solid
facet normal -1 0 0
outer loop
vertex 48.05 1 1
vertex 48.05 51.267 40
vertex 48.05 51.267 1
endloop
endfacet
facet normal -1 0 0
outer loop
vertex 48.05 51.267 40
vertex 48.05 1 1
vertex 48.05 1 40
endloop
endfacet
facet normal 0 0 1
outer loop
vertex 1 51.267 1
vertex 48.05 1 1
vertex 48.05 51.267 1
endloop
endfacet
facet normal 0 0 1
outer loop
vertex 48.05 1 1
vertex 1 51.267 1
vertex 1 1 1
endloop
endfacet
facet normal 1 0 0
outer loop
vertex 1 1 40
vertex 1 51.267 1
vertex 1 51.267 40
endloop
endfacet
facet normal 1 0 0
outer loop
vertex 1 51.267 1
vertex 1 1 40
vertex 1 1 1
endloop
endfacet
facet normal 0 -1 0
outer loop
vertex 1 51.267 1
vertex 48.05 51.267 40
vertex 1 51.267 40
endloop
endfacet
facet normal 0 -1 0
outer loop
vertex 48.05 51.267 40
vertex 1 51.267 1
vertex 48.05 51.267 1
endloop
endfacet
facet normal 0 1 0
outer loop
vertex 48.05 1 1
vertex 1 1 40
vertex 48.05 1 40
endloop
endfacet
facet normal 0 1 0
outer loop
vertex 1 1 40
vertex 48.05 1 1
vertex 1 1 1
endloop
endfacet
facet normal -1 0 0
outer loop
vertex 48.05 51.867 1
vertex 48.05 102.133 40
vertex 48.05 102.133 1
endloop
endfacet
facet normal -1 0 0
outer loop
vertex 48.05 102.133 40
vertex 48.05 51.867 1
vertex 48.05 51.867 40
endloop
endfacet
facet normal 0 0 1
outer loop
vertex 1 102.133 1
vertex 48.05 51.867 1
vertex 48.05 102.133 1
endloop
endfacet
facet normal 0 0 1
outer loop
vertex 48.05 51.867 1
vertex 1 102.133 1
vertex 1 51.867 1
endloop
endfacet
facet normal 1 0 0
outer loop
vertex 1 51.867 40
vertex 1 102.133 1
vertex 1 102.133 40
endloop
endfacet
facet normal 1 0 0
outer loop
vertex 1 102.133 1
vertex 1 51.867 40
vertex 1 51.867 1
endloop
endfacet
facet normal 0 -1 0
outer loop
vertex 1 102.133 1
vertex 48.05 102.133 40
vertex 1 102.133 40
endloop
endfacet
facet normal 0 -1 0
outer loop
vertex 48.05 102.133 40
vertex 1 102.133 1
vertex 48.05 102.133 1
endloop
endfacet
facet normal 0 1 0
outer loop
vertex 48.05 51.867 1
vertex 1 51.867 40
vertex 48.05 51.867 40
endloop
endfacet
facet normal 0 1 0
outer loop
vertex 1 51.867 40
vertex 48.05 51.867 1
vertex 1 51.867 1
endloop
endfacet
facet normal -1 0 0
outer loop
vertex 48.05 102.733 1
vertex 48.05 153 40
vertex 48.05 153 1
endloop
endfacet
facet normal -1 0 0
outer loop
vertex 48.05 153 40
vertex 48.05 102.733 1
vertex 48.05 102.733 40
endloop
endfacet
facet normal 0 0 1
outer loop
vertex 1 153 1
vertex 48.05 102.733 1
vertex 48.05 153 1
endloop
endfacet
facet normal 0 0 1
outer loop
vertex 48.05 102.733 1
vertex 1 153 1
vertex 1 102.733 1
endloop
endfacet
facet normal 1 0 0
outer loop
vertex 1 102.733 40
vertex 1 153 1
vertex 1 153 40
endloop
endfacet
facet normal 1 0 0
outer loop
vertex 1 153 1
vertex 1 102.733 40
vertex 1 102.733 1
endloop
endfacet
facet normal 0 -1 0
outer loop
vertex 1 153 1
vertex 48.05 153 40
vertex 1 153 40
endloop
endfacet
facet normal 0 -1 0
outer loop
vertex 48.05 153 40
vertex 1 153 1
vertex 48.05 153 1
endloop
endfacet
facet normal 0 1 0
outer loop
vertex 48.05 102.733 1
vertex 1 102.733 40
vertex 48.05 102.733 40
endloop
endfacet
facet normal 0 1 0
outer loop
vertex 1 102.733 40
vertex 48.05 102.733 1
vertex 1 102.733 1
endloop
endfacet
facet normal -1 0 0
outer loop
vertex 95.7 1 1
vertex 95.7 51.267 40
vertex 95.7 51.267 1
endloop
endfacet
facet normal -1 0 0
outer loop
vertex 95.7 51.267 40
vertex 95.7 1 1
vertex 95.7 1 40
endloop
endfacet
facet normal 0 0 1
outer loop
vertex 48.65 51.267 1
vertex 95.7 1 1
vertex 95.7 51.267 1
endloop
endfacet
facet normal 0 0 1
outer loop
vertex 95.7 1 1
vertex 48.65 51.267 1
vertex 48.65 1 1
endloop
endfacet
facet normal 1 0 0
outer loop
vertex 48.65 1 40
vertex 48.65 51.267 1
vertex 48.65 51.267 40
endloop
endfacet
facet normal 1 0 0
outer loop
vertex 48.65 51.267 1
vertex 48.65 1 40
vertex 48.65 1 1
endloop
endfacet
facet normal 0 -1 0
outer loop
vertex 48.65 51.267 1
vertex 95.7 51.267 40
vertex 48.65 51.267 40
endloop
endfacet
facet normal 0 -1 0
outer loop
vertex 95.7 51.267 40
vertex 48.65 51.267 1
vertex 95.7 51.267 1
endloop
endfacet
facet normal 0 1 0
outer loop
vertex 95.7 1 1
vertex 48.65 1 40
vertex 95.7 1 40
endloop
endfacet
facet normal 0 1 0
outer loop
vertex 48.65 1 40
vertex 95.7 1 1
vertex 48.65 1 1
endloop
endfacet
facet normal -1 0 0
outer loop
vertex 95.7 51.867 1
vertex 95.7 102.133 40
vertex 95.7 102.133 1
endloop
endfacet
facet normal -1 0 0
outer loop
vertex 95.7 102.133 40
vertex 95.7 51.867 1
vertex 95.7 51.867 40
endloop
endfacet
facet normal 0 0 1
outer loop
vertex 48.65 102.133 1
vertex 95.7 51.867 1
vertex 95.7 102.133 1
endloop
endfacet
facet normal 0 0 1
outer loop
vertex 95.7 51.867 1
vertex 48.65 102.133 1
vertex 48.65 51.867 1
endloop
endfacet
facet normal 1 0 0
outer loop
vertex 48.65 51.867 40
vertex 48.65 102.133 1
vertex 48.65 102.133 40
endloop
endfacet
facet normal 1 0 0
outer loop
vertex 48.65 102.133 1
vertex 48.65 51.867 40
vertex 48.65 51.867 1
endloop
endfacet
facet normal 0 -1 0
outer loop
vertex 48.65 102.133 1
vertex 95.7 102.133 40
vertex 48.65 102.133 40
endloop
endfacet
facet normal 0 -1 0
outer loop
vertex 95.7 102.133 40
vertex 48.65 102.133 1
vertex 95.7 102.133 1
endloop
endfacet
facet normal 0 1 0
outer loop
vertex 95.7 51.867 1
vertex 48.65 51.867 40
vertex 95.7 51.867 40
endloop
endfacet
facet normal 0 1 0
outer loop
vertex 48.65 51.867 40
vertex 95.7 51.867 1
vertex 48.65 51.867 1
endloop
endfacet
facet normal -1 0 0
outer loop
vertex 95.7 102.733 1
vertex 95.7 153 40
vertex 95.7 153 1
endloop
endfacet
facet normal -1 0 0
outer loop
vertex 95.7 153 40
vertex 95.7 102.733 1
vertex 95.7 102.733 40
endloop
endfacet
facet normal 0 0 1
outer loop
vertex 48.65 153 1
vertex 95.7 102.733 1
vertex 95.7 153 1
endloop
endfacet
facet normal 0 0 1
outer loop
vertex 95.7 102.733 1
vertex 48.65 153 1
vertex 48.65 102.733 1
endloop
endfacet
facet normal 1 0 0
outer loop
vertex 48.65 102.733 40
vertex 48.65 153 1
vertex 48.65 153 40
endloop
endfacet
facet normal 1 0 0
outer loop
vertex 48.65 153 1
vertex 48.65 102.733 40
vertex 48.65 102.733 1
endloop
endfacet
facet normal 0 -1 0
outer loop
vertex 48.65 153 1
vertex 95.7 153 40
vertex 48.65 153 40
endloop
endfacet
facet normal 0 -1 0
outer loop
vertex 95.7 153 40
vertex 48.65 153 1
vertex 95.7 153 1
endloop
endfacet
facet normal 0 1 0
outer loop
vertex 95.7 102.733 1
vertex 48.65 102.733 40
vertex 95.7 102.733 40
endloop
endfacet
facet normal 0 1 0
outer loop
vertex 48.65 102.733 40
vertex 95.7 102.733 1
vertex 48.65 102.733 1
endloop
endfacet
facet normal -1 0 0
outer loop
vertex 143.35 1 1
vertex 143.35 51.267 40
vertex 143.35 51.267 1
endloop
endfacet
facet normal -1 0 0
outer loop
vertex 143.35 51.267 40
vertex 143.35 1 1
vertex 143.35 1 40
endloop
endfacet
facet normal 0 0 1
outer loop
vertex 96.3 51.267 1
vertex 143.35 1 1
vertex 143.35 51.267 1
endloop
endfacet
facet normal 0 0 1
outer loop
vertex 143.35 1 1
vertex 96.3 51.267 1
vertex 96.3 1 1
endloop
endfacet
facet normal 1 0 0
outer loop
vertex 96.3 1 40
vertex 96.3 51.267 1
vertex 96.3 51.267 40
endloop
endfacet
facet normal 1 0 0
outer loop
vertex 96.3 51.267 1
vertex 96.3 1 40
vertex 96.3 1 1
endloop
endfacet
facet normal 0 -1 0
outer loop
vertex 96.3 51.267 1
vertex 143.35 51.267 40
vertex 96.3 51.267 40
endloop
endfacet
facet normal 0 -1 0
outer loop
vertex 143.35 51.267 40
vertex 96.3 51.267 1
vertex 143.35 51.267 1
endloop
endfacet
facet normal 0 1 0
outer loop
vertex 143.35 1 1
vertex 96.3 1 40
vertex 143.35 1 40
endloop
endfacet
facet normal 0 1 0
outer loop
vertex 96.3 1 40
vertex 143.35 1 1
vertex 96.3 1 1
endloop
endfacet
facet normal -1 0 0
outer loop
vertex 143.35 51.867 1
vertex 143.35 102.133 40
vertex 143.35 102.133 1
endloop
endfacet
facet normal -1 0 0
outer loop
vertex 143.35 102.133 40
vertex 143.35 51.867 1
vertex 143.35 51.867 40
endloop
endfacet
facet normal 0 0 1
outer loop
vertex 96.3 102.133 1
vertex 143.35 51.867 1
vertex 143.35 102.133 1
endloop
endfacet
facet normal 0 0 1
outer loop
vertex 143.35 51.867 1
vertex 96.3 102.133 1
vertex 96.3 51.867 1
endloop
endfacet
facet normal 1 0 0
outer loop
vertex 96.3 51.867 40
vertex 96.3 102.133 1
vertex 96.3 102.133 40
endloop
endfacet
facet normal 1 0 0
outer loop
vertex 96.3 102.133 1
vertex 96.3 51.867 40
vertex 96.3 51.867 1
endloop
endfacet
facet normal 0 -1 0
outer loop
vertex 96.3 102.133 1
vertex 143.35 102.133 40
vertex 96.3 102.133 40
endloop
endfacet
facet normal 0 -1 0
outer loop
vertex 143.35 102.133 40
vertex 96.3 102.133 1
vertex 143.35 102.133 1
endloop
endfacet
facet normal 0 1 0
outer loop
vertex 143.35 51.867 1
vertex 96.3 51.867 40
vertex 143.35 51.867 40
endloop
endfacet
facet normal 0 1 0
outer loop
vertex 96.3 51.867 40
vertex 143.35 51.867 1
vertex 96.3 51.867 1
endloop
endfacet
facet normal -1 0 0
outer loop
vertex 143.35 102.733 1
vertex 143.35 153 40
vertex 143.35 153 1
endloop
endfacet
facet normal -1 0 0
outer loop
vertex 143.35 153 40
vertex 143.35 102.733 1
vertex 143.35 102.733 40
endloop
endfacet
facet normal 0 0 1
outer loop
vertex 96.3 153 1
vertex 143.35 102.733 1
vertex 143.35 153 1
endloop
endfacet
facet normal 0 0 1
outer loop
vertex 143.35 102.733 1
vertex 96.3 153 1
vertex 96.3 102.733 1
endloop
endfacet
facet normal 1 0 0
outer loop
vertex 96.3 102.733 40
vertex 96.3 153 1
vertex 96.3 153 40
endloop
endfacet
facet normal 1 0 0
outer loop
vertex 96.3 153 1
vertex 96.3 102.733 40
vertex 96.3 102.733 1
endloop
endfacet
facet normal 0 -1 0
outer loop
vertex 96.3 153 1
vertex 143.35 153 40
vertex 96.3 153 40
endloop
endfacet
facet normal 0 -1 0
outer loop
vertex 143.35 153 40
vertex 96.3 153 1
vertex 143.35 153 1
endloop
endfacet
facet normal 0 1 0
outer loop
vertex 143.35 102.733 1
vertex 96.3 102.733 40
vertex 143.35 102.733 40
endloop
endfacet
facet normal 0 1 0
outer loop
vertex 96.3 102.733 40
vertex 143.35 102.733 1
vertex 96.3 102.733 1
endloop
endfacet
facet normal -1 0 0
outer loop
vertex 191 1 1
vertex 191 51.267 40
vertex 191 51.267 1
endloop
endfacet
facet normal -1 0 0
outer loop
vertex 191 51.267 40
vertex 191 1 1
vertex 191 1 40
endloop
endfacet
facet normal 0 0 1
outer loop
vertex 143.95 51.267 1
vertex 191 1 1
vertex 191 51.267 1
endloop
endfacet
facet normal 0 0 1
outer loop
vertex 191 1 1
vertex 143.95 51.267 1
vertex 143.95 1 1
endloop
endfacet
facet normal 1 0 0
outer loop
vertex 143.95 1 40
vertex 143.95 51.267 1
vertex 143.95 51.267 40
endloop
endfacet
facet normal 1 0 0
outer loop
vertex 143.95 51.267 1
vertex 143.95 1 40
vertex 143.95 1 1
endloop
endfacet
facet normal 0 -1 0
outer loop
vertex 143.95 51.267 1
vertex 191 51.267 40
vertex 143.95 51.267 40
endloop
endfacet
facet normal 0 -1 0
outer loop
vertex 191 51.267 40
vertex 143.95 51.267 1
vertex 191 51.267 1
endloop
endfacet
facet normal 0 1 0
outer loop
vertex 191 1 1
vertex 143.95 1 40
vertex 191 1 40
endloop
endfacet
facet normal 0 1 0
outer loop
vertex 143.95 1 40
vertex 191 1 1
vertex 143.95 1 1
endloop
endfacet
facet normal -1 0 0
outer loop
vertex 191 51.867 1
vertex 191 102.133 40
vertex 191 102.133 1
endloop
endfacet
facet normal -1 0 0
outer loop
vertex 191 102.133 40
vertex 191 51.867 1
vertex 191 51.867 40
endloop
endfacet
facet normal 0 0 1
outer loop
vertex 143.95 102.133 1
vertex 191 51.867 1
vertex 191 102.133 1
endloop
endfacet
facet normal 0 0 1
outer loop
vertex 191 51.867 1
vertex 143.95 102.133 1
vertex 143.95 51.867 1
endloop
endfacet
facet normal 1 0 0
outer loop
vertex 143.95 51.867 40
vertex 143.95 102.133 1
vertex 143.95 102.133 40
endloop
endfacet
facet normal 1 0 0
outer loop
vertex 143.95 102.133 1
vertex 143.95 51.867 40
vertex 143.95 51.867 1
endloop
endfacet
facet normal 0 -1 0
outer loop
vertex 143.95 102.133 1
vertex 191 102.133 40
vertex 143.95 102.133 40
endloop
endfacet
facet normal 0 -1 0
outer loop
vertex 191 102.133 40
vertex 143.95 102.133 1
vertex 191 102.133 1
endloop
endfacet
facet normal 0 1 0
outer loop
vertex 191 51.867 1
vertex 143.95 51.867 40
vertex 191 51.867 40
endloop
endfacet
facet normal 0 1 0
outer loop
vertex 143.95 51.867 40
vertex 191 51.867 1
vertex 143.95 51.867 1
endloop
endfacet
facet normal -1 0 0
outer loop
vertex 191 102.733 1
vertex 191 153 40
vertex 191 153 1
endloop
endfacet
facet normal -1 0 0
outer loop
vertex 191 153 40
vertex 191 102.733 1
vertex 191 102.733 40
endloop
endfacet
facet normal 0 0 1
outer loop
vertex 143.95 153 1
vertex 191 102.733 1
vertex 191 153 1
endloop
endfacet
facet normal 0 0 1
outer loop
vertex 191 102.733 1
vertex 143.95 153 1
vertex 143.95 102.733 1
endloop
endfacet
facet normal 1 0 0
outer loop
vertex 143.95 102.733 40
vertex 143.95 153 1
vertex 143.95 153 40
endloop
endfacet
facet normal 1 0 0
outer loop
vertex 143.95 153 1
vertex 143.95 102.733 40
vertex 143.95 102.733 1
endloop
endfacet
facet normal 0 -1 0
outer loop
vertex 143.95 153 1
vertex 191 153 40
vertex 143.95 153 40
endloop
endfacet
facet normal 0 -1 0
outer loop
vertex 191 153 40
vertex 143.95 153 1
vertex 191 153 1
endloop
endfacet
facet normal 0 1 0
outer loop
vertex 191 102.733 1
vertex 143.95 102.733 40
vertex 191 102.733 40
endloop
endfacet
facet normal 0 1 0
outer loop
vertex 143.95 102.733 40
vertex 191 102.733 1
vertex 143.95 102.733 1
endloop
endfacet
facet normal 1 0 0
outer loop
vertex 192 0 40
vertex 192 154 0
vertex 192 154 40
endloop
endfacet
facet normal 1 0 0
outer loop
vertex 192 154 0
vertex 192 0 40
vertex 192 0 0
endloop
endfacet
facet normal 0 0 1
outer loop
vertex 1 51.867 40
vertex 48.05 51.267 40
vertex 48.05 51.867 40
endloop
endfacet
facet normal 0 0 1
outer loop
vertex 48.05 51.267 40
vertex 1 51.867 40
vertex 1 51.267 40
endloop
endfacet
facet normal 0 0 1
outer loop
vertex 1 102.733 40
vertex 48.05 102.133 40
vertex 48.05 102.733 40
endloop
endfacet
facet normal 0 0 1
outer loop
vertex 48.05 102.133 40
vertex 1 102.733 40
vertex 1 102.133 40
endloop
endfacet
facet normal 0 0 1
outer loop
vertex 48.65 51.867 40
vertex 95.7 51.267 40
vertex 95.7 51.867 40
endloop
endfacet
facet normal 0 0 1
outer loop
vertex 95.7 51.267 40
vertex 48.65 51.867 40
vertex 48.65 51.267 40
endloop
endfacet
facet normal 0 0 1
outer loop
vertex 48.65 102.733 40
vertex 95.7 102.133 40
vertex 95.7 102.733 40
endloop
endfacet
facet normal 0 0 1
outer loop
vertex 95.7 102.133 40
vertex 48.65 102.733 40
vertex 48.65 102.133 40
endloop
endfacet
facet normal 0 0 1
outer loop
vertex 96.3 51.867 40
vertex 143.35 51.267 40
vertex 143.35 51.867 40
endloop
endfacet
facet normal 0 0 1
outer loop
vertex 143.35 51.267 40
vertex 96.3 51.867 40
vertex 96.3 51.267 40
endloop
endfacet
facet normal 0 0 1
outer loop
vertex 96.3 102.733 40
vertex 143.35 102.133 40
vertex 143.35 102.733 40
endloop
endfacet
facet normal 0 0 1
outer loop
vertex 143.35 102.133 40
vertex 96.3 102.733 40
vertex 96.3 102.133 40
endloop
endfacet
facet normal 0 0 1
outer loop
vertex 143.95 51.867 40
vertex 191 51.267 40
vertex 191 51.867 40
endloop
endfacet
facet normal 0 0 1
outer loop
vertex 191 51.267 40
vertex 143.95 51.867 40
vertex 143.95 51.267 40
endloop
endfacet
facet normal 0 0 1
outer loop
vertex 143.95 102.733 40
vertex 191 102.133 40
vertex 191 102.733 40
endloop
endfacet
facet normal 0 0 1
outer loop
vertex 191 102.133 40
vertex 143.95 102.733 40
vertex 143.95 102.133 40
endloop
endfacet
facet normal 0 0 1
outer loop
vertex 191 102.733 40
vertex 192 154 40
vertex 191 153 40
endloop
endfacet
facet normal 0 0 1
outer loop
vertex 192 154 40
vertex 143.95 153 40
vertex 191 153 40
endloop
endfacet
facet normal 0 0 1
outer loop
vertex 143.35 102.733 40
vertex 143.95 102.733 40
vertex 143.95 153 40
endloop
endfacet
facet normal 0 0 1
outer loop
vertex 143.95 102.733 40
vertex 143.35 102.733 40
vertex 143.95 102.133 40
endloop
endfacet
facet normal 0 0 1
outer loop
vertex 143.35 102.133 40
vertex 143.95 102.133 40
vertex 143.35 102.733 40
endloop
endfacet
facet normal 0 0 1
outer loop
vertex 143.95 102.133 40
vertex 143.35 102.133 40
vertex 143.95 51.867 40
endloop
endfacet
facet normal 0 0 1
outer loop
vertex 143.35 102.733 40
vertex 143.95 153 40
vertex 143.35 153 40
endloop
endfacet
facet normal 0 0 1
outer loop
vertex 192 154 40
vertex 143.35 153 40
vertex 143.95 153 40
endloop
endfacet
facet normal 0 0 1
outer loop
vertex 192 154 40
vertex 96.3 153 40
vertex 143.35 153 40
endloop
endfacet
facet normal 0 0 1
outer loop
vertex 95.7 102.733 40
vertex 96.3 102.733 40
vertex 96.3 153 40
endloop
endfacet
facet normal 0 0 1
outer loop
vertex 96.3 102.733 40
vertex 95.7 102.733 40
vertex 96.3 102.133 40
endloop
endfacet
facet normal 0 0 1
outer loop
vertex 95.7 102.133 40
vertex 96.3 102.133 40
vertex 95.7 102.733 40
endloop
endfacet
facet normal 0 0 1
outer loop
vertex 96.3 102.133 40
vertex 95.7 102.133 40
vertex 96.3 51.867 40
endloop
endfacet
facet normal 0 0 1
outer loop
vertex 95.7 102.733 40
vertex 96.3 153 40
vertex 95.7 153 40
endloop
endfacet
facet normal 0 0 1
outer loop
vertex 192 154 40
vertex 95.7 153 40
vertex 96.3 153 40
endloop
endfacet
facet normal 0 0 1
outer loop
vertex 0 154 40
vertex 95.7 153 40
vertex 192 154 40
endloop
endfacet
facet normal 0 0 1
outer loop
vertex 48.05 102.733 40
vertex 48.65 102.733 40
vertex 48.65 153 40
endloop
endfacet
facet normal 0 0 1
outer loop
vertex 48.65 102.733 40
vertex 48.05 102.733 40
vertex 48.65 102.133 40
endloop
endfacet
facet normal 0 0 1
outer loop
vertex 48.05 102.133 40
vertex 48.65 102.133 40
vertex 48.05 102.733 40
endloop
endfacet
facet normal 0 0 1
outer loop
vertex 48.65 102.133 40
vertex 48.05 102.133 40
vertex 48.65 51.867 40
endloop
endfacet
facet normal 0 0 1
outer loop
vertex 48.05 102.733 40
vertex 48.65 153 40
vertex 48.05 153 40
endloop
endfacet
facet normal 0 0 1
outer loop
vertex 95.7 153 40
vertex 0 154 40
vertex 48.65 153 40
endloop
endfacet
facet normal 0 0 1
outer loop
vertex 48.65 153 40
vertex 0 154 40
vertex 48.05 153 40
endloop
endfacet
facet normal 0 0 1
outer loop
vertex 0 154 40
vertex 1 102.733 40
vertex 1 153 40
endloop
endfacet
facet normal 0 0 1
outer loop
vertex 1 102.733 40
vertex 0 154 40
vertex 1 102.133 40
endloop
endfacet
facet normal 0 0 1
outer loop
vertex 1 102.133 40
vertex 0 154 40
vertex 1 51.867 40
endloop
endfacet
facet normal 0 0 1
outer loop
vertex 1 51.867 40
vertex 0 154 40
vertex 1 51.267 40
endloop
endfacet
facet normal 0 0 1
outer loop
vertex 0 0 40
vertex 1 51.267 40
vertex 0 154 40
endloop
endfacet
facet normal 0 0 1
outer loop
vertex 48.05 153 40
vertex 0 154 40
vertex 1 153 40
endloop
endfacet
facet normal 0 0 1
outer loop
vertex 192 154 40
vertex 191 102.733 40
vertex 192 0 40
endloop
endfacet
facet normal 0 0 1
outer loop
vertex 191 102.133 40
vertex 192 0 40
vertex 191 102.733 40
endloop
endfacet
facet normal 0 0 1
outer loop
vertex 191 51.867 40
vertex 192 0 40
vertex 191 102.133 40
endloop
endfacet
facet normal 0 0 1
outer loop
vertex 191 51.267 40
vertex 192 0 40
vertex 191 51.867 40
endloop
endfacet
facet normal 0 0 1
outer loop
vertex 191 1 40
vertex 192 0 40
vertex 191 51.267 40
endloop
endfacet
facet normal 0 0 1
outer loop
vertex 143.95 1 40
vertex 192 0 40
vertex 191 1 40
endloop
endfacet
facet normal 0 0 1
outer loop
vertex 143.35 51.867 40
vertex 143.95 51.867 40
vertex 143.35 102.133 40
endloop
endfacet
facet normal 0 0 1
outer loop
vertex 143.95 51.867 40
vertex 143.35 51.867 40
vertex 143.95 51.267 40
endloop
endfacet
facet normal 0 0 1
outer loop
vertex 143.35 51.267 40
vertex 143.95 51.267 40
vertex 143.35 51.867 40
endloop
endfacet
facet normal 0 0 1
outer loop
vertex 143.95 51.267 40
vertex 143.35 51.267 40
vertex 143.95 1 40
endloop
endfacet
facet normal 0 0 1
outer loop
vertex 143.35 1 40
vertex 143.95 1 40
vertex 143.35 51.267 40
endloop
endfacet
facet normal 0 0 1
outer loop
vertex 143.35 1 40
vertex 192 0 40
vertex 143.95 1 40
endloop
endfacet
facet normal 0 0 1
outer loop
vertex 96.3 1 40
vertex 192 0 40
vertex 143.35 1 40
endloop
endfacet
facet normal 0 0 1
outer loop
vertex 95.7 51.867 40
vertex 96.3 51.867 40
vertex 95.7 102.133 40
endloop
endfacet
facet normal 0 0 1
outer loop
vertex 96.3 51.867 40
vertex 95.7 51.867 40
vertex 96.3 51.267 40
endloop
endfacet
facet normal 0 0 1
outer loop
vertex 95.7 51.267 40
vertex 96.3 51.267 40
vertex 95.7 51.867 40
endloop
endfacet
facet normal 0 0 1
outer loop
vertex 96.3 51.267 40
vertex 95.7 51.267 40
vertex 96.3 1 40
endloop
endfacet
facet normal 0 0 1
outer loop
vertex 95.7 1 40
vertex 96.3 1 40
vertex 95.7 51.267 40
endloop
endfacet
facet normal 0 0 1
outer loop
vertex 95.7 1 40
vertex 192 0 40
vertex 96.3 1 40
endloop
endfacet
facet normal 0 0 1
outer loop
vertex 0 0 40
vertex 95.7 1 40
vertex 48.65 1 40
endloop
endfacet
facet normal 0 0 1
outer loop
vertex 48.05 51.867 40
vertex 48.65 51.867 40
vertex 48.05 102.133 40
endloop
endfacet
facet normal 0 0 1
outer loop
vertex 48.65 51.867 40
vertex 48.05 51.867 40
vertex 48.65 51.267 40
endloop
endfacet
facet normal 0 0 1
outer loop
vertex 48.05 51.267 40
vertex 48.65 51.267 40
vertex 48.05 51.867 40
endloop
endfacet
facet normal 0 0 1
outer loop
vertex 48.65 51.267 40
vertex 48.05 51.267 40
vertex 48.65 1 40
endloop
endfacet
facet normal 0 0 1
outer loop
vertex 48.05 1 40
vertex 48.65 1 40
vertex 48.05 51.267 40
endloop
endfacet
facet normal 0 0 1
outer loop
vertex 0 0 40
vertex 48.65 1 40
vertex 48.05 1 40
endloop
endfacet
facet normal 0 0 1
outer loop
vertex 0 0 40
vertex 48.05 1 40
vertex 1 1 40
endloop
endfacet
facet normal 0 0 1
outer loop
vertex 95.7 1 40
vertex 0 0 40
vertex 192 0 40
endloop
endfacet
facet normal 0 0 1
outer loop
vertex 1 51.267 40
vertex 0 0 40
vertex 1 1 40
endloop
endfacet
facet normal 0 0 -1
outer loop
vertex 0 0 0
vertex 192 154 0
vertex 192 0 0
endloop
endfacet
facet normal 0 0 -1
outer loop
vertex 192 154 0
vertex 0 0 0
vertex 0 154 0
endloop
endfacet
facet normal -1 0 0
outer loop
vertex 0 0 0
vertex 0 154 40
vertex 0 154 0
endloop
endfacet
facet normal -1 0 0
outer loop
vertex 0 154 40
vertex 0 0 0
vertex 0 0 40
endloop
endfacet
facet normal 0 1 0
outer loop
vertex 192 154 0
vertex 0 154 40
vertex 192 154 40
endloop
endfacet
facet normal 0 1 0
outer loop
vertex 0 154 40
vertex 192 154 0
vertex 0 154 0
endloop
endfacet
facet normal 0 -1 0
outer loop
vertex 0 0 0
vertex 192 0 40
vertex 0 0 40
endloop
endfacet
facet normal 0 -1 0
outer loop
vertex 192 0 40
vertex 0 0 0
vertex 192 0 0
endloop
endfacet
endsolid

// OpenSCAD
/////////////////Parameters
/* [Sizes] */
// total width
tw =192;
// total length
tl = 154;
// height
owh = 40;
// boxes in width direction
nw=4; // [1:10]
// boxes in length direction
nl=3; // [1:10]
// outer wall width
oww = 1;
// inner wall width 
iww = 0.6;
/* [Hidden] */

//drawing

boxes(nw,nl,oww,iww,owh,(tw-2*oww+iww)/nw,(tl-2*oww+iww)/nl);

//////////////////Calculations + modules

module boxes(nbw,nbl,ow,iw,oh,boxw,boxl) {
	difference() {
		cube([nbw*boxw+ow+ow-iw,nbl*boxl+ow+ow-iw,oh]);
		for (i=[0:nbw-1])
			for (j=[0:nbl-1])
				translate([i*boxw+ow,j*boxl+ow,ow])
					#cube([boxw-iw,boxl-iw,oh]);
	}
}

